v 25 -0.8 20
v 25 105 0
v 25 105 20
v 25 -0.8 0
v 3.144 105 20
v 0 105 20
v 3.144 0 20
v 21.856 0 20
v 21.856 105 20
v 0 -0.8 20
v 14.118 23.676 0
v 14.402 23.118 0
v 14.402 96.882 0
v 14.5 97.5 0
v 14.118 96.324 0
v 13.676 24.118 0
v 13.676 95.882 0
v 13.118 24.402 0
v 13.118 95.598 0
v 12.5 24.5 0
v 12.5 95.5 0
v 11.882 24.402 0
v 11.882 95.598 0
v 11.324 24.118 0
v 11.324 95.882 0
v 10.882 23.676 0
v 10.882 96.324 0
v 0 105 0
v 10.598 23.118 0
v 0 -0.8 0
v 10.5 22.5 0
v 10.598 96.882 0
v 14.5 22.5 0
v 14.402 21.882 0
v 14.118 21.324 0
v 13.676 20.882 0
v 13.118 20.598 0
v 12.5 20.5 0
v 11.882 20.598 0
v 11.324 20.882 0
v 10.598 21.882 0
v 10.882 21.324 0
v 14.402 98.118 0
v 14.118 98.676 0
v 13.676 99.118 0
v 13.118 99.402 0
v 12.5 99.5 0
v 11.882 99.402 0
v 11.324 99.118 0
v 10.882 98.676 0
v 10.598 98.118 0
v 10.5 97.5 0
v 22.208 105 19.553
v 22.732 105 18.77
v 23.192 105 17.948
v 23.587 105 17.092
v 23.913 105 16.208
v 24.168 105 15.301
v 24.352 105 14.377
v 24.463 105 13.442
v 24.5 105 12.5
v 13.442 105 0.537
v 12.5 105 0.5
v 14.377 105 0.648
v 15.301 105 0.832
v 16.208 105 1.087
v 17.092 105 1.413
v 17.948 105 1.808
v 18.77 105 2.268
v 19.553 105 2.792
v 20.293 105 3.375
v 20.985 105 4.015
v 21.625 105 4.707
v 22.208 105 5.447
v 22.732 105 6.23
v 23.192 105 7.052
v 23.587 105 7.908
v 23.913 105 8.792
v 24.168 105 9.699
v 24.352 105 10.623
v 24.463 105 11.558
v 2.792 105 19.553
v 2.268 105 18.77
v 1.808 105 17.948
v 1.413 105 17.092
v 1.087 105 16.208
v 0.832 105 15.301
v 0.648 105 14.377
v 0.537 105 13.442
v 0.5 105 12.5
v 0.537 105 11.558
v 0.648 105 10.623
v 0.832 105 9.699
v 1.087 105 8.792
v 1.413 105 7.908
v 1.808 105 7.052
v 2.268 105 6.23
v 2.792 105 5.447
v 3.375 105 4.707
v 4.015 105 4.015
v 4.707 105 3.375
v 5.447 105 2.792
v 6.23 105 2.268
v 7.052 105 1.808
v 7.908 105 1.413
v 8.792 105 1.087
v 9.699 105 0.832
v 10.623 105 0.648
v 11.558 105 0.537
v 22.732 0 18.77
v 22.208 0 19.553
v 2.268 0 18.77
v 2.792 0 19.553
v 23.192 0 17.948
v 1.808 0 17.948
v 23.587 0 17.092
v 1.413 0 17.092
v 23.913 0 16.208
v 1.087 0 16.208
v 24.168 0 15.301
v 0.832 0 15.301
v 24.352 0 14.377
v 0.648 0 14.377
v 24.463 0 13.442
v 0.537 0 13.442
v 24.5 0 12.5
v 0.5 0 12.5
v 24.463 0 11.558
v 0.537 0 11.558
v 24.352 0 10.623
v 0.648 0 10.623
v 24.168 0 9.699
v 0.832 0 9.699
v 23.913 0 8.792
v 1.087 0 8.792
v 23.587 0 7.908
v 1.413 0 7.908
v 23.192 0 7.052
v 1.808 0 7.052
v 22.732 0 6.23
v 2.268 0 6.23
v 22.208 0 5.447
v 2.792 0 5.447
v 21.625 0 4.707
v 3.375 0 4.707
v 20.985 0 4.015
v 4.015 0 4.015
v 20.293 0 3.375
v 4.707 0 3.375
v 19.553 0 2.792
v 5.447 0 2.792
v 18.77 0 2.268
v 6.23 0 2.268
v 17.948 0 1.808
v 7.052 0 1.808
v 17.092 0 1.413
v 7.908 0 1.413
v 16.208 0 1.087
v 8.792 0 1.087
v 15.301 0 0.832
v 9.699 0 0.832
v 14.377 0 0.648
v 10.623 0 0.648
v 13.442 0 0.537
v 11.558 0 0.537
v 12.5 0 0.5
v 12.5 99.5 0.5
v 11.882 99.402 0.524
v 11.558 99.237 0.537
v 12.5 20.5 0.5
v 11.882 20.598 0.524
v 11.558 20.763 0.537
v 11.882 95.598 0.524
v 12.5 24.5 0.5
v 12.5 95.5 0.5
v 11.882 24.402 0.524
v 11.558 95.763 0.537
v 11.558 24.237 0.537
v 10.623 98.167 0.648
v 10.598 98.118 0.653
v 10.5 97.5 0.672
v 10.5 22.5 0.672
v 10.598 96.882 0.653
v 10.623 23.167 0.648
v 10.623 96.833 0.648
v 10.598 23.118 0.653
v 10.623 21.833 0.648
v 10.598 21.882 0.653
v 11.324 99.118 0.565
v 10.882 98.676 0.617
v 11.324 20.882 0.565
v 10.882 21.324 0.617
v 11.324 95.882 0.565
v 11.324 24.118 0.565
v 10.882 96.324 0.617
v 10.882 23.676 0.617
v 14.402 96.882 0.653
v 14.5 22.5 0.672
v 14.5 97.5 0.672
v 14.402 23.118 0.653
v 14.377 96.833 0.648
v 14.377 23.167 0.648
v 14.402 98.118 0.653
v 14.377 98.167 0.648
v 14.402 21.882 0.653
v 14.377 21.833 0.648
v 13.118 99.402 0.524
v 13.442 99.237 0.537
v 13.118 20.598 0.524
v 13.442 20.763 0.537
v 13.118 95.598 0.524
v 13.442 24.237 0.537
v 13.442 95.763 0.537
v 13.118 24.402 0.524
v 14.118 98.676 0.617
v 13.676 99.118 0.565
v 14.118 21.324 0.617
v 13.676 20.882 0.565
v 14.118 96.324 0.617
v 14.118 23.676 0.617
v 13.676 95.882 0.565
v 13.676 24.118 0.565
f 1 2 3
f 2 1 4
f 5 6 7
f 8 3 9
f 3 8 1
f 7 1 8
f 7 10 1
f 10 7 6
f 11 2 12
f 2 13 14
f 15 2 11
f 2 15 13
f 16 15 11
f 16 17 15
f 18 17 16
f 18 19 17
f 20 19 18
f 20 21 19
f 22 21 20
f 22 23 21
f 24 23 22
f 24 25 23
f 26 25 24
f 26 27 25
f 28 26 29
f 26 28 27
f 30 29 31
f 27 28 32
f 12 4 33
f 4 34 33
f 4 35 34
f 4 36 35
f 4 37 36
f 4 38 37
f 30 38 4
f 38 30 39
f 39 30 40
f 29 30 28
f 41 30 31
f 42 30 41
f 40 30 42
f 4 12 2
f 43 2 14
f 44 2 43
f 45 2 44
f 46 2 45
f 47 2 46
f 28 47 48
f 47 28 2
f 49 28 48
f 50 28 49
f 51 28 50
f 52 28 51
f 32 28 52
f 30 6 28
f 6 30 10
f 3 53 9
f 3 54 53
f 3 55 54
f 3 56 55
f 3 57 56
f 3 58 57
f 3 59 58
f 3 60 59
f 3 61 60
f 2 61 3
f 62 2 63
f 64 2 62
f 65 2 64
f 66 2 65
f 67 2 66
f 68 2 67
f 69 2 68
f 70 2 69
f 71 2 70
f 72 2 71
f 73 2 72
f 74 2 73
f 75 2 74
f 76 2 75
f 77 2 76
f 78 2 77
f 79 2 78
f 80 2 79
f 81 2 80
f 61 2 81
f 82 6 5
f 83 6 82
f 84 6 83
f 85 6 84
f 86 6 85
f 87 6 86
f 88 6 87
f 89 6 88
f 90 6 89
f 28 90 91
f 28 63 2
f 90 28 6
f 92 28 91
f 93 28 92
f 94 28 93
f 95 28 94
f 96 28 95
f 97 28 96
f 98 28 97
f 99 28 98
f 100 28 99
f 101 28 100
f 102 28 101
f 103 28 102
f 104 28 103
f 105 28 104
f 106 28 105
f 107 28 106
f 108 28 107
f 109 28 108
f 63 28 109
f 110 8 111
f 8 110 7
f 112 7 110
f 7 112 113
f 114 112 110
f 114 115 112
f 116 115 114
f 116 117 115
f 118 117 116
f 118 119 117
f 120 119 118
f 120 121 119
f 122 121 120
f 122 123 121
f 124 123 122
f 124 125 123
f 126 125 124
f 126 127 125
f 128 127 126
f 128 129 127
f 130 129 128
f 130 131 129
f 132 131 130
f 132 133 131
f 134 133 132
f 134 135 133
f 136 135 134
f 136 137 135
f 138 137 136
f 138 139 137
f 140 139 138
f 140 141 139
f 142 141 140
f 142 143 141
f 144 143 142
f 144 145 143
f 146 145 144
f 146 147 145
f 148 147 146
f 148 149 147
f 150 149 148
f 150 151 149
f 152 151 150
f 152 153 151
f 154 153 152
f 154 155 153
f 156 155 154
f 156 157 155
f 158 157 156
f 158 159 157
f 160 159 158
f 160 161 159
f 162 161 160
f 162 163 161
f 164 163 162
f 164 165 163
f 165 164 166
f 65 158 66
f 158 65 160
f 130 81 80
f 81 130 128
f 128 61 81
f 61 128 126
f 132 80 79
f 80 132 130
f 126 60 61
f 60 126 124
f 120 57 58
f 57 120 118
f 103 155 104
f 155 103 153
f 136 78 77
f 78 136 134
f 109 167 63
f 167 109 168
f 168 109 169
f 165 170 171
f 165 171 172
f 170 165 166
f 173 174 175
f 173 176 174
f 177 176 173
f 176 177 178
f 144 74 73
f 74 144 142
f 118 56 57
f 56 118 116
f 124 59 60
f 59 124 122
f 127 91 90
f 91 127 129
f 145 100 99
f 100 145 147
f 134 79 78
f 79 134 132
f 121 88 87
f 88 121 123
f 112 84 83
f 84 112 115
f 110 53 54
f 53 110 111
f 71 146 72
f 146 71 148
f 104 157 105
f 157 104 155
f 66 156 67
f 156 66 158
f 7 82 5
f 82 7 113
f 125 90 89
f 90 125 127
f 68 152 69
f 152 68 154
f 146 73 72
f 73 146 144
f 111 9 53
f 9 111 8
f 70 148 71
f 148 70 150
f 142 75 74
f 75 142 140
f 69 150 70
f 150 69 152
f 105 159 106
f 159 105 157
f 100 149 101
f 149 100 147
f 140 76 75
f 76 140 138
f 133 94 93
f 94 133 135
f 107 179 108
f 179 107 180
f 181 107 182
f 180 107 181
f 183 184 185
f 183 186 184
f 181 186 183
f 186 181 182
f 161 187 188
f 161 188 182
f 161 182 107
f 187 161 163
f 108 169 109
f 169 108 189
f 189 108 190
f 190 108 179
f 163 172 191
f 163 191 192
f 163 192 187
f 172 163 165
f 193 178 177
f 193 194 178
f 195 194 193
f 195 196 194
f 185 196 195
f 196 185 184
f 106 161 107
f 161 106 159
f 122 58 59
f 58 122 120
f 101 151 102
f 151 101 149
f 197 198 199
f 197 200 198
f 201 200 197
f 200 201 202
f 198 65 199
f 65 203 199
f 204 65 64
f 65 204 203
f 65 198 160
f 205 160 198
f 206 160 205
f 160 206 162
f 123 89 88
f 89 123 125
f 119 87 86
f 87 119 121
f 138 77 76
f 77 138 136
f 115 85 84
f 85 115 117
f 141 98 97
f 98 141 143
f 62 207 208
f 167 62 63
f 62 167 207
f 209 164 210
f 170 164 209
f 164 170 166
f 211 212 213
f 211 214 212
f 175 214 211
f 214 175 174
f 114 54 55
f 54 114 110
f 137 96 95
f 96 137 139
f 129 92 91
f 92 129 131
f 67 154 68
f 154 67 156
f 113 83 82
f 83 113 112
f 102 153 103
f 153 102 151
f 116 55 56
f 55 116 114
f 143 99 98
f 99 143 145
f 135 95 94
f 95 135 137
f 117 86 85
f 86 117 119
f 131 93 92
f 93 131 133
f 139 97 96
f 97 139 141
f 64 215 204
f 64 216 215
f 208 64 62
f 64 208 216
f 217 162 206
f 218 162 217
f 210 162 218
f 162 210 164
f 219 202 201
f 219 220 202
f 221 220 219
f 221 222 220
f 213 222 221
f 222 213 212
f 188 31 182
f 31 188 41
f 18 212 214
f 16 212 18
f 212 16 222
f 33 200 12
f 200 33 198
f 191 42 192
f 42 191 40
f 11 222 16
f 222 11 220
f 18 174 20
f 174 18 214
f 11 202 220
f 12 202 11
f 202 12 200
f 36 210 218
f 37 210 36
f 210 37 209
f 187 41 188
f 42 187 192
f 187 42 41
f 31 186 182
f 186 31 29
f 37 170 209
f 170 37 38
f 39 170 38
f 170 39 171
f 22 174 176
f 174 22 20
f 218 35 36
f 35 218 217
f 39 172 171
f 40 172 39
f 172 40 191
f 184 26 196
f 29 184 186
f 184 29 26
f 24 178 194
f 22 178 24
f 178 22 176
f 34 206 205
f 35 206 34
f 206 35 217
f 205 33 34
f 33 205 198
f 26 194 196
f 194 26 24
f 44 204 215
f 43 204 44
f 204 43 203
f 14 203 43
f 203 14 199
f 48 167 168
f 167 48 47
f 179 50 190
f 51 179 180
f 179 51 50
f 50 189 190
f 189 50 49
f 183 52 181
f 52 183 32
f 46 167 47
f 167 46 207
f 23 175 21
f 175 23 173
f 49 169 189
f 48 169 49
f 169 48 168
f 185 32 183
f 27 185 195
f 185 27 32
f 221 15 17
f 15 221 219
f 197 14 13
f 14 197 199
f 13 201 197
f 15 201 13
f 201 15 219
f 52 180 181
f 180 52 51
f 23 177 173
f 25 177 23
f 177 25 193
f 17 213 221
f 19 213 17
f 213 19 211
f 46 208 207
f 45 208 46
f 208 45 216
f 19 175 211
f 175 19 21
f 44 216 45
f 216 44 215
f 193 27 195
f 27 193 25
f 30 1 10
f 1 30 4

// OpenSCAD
difference() {
  cube([25,105,20]);
  translate([12.5,-.5,12.5]) rotate([-90,0,0]) cylinder(d=24,h=106,$fn=80);
  translate([12.5,22.5]) cylinder(d=4,h=2,$fn=20,center=true);
  translate([12.5,97.5]) cylinder(d=4,h=2,$fn=20,center=true);
}
translate([0,-.8]) cube([25,.8,20]);
